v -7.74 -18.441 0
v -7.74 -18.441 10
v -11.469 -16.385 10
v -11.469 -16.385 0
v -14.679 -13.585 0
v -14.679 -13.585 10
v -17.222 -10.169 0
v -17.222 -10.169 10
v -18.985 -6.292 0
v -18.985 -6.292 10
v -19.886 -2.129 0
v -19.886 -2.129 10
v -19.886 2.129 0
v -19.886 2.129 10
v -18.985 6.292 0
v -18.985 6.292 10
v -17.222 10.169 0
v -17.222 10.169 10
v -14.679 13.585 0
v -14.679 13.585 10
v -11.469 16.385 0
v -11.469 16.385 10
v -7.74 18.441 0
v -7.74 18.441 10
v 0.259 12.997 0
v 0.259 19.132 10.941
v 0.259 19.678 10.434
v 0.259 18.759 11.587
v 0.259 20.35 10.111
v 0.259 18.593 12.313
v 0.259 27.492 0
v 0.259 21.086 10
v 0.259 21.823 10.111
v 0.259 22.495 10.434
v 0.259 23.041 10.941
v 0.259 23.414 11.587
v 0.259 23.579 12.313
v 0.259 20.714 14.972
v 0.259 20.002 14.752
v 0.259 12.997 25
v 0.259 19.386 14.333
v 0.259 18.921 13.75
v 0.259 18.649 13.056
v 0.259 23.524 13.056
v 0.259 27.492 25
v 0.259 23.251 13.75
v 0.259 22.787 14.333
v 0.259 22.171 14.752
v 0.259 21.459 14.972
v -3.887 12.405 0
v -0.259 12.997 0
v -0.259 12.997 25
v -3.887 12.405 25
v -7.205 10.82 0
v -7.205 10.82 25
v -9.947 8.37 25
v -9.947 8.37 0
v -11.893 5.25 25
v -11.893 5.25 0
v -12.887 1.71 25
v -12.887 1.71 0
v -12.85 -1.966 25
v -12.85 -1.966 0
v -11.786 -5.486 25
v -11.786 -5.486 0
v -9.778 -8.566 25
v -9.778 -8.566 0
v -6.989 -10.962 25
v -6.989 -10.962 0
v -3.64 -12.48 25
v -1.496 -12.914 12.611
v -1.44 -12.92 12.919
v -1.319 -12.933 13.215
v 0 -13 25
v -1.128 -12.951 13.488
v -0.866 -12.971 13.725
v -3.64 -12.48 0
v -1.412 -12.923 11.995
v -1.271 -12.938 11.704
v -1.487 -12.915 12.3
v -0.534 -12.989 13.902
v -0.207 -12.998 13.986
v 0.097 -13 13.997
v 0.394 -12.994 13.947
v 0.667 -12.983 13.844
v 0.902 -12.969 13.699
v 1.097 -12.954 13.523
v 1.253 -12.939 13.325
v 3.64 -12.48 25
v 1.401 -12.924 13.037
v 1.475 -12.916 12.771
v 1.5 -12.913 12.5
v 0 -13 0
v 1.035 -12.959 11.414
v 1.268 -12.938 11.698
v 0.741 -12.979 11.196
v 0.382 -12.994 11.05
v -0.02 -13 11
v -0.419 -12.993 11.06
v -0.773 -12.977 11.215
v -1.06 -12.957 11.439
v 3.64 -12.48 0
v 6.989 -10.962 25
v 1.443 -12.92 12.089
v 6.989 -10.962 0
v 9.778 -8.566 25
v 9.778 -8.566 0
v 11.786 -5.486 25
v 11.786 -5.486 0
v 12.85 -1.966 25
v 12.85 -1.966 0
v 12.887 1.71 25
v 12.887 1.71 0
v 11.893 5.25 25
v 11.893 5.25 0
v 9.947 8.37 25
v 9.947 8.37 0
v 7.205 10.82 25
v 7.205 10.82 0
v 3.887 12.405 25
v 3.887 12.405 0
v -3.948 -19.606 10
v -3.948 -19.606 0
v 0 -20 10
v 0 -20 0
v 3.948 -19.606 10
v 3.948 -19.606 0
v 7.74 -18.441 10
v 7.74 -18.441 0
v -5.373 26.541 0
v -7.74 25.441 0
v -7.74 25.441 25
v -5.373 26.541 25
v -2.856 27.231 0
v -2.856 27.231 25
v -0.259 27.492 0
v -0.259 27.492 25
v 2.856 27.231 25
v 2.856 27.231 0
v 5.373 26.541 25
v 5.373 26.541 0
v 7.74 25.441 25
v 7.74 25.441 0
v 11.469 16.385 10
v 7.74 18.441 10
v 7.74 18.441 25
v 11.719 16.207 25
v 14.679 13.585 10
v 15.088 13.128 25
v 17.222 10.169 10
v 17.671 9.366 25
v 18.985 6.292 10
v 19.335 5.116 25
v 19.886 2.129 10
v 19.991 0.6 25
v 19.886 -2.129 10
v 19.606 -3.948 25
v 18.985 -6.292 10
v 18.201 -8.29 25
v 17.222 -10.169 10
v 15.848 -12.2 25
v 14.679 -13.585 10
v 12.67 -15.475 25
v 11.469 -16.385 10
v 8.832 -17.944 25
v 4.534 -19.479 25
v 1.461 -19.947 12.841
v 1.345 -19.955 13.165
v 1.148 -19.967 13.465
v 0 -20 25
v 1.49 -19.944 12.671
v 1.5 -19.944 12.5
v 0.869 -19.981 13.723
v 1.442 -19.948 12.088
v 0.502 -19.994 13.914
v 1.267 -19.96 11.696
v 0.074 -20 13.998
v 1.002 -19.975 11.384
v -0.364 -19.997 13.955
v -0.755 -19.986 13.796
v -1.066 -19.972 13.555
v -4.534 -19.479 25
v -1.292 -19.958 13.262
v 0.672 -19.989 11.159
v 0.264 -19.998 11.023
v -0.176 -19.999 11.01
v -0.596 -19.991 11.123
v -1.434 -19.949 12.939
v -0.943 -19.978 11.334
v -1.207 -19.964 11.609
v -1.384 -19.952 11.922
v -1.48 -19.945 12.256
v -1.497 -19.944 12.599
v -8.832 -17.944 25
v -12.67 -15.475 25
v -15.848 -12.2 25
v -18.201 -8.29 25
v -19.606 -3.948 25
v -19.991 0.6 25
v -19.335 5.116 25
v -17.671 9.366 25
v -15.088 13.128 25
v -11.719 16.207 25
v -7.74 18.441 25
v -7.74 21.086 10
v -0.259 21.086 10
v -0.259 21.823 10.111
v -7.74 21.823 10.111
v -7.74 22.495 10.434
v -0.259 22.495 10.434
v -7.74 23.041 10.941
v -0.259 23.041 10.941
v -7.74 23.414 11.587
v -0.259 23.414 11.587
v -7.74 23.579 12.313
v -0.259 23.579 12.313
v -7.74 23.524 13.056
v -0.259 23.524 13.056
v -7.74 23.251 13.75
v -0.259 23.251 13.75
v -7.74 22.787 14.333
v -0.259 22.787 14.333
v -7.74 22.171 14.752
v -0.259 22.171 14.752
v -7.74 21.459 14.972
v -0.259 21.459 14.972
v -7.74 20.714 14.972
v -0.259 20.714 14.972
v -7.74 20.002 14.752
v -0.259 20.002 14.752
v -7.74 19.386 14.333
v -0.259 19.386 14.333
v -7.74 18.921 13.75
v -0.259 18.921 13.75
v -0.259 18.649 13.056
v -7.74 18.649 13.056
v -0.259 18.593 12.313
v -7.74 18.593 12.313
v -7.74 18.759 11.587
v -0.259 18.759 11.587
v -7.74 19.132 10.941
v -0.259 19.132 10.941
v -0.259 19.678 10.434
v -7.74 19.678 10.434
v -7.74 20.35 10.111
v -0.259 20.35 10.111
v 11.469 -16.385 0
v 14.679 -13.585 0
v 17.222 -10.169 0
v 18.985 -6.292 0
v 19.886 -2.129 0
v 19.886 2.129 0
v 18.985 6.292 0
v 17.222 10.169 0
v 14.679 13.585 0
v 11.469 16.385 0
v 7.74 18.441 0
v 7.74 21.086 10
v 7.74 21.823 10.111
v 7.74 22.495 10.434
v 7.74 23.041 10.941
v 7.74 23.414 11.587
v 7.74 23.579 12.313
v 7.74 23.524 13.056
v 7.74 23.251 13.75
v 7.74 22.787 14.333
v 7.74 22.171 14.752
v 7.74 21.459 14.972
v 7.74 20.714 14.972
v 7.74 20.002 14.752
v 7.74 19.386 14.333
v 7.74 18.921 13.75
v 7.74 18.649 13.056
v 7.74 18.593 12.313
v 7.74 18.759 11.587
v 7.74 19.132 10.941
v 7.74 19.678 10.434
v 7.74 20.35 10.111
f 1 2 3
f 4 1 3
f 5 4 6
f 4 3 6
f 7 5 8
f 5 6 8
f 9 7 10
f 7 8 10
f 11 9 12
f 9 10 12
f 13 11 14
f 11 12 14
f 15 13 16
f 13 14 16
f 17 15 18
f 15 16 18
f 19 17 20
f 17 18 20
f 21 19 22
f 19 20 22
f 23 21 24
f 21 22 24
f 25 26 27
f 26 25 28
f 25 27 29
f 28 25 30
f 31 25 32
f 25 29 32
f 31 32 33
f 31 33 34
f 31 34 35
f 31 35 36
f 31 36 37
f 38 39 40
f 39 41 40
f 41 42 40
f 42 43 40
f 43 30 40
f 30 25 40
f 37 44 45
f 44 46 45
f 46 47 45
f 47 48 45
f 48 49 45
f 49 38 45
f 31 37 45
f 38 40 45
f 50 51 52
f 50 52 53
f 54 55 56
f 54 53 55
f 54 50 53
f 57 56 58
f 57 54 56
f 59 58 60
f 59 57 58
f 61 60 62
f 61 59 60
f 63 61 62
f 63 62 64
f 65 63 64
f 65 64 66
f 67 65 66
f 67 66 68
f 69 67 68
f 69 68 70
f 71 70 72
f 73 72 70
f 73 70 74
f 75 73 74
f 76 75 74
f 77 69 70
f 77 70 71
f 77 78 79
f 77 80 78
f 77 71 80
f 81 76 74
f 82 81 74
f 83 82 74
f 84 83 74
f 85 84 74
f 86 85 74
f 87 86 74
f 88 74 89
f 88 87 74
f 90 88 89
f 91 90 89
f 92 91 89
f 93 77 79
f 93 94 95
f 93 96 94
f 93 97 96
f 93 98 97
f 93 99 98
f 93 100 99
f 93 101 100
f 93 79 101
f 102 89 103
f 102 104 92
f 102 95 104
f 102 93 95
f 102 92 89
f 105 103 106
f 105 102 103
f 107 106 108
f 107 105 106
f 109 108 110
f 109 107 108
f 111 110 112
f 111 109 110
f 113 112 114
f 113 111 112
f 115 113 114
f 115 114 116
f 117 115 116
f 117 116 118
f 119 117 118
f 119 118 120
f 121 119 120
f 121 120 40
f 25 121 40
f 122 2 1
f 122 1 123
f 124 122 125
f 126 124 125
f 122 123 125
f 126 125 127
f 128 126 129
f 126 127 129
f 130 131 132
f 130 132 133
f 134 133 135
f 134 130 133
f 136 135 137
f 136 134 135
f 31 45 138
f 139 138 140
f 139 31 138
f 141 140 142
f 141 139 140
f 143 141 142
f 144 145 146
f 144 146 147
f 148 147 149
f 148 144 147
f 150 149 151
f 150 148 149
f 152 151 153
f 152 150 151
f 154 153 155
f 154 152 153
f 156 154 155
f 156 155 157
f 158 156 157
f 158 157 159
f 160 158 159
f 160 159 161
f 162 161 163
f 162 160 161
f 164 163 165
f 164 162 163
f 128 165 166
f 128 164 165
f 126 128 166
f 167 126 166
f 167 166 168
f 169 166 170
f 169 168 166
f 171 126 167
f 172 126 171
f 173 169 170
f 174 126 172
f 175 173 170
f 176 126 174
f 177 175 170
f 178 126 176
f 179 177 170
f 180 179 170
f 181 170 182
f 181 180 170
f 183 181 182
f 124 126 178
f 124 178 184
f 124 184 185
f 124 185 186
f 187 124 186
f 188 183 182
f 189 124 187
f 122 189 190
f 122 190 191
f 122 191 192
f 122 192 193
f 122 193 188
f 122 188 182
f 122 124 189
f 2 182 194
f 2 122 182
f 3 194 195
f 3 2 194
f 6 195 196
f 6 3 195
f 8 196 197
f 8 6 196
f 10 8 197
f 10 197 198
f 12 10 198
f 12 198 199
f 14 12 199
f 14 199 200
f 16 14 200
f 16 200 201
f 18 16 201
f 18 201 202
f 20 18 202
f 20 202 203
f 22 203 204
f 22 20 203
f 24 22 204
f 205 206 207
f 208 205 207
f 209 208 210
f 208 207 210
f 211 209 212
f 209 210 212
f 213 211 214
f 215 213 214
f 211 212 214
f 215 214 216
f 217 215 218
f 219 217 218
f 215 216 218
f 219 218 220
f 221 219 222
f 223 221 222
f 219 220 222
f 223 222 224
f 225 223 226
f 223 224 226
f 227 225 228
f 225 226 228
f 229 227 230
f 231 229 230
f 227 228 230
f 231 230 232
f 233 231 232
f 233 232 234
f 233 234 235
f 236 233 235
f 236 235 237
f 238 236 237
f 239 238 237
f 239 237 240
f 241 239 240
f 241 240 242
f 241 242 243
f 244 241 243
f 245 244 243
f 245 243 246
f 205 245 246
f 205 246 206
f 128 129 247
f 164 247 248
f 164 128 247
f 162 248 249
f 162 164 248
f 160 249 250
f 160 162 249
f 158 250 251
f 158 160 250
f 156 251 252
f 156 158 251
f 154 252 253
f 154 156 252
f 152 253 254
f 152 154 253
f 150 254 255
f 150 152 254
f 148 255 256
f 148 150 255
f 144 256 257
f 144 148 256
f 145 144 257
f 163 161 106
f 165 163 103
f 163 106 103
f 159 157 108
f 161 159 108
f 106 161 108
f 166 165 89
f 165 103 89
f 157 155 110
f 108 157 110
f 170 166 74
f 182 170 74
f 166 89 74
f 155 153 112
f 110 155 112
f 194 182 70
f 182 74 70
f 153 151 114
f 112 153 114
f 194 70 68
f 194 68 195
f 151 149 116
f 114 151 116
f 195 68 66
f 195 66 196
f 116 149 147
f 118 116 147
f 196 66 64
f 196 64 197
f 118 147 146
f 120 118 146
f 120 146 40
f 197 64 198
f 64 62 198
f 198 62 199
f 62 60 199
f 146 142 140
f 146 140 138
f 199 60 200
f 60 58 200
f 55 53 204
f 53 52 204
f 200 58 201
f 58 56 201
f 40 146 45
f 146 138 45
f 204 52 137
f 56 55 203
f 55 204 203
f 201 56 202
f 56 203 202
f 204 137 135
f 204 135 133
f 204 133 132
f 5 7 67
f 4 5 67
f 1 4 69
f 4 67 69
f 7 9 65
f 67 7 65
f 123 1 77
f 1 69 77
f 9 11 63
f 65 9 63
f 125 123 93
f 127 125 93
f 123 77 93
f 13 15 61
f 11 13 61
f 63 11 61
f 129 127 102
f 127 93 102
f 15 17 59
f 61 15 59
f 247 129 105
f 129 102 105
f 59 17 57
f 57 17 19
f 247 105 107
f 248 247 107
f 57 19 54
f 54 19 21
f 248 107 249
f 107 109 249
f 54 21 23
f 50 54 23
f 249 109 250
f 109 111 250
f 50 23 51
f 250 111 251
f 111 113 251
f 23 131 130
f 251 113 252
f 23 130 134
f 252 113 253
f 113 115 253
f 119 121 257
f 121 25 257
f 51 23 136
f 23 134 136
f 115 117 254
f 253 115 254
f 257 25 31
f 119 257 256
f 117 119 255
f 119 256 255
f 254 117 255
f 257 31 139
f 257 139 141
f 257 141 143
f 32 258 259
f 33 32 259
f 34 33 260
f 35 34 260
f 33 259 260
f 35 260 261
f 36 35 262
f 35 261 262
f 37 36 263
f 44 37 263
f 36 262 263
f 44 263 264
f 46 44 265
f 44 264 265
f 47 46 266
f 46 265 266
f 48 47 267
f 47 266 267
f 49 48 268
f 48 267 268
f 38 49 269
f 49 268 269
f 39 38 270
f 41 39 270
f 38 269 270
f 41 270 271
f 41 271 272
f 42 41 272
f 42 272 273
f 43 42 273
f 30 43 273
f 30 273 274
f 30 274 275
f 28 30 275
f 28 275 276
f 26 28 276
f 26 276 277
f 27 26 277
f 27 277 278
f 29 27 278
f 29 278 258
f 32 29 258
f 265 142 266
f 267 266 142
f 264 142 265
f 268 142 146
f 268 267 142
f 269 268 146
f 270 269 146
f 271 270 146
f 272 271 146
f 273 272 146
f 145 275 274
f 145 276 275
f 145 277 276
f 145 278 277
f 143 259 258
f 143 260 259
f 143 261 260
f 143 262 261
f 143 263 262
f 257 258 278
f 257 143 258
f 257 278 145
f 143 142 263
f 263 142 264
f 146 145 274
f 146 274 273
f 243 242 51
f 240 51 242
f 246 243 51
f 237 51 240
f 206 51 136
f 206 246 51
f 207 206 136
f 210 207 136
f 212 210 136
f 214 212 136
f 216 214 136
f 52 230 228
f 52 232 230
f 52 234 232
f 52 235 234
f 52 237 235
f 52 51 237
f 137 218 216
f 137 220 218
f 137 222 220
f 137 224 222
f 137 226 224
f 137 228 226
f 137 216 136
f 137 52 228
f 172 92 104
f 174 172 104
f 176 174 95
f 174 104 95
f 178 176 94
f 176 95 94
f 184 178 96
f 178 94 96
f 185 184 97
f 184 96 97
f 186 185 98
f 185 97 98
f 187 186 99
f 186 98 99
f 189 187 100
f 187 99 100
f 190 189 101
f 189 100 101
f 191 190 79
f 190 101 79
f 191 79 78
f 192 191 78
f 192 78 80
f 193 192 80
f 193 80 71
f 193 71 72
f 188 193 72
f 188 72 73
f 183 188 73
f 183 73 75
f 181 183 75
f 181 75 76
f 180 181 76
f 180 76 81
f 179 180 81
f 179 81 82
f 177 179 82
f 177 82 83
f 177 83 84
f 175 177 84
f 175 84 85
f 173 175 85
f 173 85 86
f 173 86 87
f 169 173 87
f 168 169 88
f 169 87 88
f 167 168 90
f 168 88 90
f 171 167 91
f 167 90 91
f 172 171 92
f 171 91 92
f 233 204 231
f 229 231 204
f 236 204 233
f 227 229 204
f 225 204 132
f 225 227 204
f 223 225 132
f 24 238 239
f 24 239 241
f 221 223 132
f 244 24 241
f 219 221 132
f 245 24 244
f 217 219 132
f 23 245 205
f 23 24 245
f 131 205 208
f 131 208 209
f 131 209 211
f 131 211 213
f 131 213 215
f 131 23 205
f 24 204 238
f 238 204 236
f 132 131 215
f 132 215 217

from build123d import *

# Parameters (mm, degrees)
SKETCH_1_R          = 3.5
SKETCH_1_R_2        = 13
EXTRUDE_2_DEPTH     = 10
SKETCH_2_R          = 13
EXTRUDE_3_DEPTH     = 15
SKETCH_3_W          = 0.517195108
SKETCH_3_H          = 18.726193104
CUT_EXTRUDE_1_DEPTH = 26
SKETCH_4_R          = 2.5
CUT_EXTRUDE_2_DEPTH = 43.740275714
CUT_EXTRUDE_3_DEPTH = 11
SKETCH_6_R          = 1.5
CUT_EXTRUDE_4_DEPTH = 21


with BuildPart() as part:
    # 草图1 → 凸台-拉伸2 (new body)
    with BuildSketch(Plane.XY):
        with BuildLine():
            Line((-35, -7), (-7.740275714, -18.44147857))
            ThreePointArc((-7.740275714, -18.44147857), (0, -20), (7.740275714, -18.44147857))
            Line((7.740275714, -18.44147857), (35, -7))
            Line((35, -7), (35, 7))
            Line((35, 7), (7.740275714, 18.44147857))
            Line((7.740275714, 18.44147857), (7.740275714, 25.44147857))
            ThreePointArc((7.740275714, 25.44147857), (0, 27.494244152), (-7.740275714, 25.44147857))
            Line((-7.740275714, 25.44147857), (-7.740275714, 18.44147857))
            Line((-7.740275714, 18.44147857), (-35, 7))
            Line((-35, 7), (-35, -7))
        make_face()
        with Locations((-28, 0)):
            Circle(SKETCH_1_R, mode=Mode.SUBTRACT)
        Circle(SKETCH_1_R_2, mode=Mode.SUBTRACT)
        with Locations((28, 0)):
            Circle(SKETCH_1_R, mode=Mode.SUBTRACT)
    extrude(amount=EXTRUDE_2_DEPTH)

    # 草图2 → 凸台-拉伸3 (add)
    with BuildSketch(Plane.XY.offset(10)):
        with BuildLine():
            Line((-7.740275714, 18.44147857), (-7.740275714, 25.44147857))
            ThreePointArc((-7.740275714, 25.44147857), (0, 27.494244152), (7.740275714, 25.44147857))
            Line((7.740275714, 25.44147857), (7.740275714, 18.44147857))
            ThreePointArc((7.740275714, 18.44147857), (0, -20), (-7.740275714, 18.44147857))
        make_face()
        Circle(SKETCH_2_R, mode=Mode.SUBTRACT)
    extrude(amount=EXTRUDE_3_DEPTH)

    # 草图3 → 切除-拉伸1 (cut, through all)
    with BuildSketch(Plane.XY.offset(25)):
        with Locations((0, 21.741202931)):
            Rectangle(SKETCH_3_W, SKETCH_3_H)
    extrude(amount=-CUT_EXTRUDE_1_DEPTH, mode=Mode.SUBTRACT)

    # 草图4 → 切除-拉伸2 (cut, through all)
    with BuildSketch(Plane(origin=(7.740275714, 0, 0), x_dir=(0, 0, -1), z_dir=(1, 0, 0))):
        with Locations((-12.5, 21.086423576)):
            Circle(SKETCH_4_R)
    extrude(amount=-CUT_EXTRUDE_2_DEPTH, mode=Mode.SUBTRACT)

    # 草图5 → 切除-拉伸3 (cut, through all)
    with BuildSketch(Plane.XY.offset(10)):
        with BuildLine():
            Line((-7.740275714, 18.44147857), (-35, 7))
            Line((-35, 7), (-35, -7))
            Line((-35, -7), (-7.740275714, -18.44147857))
            ThreePointArc((-7.740275714, -18.44147857), (-20, 0), (-7.740275714, 18.44147857))
        make_face()
        with BuildLine():
            Line((7.740275714, 18.44147857), (35, 7))
            Line((35, 7), (35, -7))
            Line((35, -7), (7.740275714, -18.44147857))
            ThreePointArc((7.740275714, -18.44147857), (20, 0), (7.740275714, 18.44147857))
        make_face()
    extrude(amount=-CUT_EXTRUDE_3_DEPTH, mode=Mode.SUBTRACT)

    # 草图6 → 切除-拉伸4 (cut, through all)
    with BuildSketch(Plane(origin=(0, 0, 0), x_dir=(1, 0, 0), z_dir=(0, 1, 0))):
        with Locations((0, -12.5)):
            Circle(SKETCH_6_R)
    extrude(amount=-CUT_EXTRUDE_4_DEPTH, mode=Mode.SUBTRACT)


solid = part.part
